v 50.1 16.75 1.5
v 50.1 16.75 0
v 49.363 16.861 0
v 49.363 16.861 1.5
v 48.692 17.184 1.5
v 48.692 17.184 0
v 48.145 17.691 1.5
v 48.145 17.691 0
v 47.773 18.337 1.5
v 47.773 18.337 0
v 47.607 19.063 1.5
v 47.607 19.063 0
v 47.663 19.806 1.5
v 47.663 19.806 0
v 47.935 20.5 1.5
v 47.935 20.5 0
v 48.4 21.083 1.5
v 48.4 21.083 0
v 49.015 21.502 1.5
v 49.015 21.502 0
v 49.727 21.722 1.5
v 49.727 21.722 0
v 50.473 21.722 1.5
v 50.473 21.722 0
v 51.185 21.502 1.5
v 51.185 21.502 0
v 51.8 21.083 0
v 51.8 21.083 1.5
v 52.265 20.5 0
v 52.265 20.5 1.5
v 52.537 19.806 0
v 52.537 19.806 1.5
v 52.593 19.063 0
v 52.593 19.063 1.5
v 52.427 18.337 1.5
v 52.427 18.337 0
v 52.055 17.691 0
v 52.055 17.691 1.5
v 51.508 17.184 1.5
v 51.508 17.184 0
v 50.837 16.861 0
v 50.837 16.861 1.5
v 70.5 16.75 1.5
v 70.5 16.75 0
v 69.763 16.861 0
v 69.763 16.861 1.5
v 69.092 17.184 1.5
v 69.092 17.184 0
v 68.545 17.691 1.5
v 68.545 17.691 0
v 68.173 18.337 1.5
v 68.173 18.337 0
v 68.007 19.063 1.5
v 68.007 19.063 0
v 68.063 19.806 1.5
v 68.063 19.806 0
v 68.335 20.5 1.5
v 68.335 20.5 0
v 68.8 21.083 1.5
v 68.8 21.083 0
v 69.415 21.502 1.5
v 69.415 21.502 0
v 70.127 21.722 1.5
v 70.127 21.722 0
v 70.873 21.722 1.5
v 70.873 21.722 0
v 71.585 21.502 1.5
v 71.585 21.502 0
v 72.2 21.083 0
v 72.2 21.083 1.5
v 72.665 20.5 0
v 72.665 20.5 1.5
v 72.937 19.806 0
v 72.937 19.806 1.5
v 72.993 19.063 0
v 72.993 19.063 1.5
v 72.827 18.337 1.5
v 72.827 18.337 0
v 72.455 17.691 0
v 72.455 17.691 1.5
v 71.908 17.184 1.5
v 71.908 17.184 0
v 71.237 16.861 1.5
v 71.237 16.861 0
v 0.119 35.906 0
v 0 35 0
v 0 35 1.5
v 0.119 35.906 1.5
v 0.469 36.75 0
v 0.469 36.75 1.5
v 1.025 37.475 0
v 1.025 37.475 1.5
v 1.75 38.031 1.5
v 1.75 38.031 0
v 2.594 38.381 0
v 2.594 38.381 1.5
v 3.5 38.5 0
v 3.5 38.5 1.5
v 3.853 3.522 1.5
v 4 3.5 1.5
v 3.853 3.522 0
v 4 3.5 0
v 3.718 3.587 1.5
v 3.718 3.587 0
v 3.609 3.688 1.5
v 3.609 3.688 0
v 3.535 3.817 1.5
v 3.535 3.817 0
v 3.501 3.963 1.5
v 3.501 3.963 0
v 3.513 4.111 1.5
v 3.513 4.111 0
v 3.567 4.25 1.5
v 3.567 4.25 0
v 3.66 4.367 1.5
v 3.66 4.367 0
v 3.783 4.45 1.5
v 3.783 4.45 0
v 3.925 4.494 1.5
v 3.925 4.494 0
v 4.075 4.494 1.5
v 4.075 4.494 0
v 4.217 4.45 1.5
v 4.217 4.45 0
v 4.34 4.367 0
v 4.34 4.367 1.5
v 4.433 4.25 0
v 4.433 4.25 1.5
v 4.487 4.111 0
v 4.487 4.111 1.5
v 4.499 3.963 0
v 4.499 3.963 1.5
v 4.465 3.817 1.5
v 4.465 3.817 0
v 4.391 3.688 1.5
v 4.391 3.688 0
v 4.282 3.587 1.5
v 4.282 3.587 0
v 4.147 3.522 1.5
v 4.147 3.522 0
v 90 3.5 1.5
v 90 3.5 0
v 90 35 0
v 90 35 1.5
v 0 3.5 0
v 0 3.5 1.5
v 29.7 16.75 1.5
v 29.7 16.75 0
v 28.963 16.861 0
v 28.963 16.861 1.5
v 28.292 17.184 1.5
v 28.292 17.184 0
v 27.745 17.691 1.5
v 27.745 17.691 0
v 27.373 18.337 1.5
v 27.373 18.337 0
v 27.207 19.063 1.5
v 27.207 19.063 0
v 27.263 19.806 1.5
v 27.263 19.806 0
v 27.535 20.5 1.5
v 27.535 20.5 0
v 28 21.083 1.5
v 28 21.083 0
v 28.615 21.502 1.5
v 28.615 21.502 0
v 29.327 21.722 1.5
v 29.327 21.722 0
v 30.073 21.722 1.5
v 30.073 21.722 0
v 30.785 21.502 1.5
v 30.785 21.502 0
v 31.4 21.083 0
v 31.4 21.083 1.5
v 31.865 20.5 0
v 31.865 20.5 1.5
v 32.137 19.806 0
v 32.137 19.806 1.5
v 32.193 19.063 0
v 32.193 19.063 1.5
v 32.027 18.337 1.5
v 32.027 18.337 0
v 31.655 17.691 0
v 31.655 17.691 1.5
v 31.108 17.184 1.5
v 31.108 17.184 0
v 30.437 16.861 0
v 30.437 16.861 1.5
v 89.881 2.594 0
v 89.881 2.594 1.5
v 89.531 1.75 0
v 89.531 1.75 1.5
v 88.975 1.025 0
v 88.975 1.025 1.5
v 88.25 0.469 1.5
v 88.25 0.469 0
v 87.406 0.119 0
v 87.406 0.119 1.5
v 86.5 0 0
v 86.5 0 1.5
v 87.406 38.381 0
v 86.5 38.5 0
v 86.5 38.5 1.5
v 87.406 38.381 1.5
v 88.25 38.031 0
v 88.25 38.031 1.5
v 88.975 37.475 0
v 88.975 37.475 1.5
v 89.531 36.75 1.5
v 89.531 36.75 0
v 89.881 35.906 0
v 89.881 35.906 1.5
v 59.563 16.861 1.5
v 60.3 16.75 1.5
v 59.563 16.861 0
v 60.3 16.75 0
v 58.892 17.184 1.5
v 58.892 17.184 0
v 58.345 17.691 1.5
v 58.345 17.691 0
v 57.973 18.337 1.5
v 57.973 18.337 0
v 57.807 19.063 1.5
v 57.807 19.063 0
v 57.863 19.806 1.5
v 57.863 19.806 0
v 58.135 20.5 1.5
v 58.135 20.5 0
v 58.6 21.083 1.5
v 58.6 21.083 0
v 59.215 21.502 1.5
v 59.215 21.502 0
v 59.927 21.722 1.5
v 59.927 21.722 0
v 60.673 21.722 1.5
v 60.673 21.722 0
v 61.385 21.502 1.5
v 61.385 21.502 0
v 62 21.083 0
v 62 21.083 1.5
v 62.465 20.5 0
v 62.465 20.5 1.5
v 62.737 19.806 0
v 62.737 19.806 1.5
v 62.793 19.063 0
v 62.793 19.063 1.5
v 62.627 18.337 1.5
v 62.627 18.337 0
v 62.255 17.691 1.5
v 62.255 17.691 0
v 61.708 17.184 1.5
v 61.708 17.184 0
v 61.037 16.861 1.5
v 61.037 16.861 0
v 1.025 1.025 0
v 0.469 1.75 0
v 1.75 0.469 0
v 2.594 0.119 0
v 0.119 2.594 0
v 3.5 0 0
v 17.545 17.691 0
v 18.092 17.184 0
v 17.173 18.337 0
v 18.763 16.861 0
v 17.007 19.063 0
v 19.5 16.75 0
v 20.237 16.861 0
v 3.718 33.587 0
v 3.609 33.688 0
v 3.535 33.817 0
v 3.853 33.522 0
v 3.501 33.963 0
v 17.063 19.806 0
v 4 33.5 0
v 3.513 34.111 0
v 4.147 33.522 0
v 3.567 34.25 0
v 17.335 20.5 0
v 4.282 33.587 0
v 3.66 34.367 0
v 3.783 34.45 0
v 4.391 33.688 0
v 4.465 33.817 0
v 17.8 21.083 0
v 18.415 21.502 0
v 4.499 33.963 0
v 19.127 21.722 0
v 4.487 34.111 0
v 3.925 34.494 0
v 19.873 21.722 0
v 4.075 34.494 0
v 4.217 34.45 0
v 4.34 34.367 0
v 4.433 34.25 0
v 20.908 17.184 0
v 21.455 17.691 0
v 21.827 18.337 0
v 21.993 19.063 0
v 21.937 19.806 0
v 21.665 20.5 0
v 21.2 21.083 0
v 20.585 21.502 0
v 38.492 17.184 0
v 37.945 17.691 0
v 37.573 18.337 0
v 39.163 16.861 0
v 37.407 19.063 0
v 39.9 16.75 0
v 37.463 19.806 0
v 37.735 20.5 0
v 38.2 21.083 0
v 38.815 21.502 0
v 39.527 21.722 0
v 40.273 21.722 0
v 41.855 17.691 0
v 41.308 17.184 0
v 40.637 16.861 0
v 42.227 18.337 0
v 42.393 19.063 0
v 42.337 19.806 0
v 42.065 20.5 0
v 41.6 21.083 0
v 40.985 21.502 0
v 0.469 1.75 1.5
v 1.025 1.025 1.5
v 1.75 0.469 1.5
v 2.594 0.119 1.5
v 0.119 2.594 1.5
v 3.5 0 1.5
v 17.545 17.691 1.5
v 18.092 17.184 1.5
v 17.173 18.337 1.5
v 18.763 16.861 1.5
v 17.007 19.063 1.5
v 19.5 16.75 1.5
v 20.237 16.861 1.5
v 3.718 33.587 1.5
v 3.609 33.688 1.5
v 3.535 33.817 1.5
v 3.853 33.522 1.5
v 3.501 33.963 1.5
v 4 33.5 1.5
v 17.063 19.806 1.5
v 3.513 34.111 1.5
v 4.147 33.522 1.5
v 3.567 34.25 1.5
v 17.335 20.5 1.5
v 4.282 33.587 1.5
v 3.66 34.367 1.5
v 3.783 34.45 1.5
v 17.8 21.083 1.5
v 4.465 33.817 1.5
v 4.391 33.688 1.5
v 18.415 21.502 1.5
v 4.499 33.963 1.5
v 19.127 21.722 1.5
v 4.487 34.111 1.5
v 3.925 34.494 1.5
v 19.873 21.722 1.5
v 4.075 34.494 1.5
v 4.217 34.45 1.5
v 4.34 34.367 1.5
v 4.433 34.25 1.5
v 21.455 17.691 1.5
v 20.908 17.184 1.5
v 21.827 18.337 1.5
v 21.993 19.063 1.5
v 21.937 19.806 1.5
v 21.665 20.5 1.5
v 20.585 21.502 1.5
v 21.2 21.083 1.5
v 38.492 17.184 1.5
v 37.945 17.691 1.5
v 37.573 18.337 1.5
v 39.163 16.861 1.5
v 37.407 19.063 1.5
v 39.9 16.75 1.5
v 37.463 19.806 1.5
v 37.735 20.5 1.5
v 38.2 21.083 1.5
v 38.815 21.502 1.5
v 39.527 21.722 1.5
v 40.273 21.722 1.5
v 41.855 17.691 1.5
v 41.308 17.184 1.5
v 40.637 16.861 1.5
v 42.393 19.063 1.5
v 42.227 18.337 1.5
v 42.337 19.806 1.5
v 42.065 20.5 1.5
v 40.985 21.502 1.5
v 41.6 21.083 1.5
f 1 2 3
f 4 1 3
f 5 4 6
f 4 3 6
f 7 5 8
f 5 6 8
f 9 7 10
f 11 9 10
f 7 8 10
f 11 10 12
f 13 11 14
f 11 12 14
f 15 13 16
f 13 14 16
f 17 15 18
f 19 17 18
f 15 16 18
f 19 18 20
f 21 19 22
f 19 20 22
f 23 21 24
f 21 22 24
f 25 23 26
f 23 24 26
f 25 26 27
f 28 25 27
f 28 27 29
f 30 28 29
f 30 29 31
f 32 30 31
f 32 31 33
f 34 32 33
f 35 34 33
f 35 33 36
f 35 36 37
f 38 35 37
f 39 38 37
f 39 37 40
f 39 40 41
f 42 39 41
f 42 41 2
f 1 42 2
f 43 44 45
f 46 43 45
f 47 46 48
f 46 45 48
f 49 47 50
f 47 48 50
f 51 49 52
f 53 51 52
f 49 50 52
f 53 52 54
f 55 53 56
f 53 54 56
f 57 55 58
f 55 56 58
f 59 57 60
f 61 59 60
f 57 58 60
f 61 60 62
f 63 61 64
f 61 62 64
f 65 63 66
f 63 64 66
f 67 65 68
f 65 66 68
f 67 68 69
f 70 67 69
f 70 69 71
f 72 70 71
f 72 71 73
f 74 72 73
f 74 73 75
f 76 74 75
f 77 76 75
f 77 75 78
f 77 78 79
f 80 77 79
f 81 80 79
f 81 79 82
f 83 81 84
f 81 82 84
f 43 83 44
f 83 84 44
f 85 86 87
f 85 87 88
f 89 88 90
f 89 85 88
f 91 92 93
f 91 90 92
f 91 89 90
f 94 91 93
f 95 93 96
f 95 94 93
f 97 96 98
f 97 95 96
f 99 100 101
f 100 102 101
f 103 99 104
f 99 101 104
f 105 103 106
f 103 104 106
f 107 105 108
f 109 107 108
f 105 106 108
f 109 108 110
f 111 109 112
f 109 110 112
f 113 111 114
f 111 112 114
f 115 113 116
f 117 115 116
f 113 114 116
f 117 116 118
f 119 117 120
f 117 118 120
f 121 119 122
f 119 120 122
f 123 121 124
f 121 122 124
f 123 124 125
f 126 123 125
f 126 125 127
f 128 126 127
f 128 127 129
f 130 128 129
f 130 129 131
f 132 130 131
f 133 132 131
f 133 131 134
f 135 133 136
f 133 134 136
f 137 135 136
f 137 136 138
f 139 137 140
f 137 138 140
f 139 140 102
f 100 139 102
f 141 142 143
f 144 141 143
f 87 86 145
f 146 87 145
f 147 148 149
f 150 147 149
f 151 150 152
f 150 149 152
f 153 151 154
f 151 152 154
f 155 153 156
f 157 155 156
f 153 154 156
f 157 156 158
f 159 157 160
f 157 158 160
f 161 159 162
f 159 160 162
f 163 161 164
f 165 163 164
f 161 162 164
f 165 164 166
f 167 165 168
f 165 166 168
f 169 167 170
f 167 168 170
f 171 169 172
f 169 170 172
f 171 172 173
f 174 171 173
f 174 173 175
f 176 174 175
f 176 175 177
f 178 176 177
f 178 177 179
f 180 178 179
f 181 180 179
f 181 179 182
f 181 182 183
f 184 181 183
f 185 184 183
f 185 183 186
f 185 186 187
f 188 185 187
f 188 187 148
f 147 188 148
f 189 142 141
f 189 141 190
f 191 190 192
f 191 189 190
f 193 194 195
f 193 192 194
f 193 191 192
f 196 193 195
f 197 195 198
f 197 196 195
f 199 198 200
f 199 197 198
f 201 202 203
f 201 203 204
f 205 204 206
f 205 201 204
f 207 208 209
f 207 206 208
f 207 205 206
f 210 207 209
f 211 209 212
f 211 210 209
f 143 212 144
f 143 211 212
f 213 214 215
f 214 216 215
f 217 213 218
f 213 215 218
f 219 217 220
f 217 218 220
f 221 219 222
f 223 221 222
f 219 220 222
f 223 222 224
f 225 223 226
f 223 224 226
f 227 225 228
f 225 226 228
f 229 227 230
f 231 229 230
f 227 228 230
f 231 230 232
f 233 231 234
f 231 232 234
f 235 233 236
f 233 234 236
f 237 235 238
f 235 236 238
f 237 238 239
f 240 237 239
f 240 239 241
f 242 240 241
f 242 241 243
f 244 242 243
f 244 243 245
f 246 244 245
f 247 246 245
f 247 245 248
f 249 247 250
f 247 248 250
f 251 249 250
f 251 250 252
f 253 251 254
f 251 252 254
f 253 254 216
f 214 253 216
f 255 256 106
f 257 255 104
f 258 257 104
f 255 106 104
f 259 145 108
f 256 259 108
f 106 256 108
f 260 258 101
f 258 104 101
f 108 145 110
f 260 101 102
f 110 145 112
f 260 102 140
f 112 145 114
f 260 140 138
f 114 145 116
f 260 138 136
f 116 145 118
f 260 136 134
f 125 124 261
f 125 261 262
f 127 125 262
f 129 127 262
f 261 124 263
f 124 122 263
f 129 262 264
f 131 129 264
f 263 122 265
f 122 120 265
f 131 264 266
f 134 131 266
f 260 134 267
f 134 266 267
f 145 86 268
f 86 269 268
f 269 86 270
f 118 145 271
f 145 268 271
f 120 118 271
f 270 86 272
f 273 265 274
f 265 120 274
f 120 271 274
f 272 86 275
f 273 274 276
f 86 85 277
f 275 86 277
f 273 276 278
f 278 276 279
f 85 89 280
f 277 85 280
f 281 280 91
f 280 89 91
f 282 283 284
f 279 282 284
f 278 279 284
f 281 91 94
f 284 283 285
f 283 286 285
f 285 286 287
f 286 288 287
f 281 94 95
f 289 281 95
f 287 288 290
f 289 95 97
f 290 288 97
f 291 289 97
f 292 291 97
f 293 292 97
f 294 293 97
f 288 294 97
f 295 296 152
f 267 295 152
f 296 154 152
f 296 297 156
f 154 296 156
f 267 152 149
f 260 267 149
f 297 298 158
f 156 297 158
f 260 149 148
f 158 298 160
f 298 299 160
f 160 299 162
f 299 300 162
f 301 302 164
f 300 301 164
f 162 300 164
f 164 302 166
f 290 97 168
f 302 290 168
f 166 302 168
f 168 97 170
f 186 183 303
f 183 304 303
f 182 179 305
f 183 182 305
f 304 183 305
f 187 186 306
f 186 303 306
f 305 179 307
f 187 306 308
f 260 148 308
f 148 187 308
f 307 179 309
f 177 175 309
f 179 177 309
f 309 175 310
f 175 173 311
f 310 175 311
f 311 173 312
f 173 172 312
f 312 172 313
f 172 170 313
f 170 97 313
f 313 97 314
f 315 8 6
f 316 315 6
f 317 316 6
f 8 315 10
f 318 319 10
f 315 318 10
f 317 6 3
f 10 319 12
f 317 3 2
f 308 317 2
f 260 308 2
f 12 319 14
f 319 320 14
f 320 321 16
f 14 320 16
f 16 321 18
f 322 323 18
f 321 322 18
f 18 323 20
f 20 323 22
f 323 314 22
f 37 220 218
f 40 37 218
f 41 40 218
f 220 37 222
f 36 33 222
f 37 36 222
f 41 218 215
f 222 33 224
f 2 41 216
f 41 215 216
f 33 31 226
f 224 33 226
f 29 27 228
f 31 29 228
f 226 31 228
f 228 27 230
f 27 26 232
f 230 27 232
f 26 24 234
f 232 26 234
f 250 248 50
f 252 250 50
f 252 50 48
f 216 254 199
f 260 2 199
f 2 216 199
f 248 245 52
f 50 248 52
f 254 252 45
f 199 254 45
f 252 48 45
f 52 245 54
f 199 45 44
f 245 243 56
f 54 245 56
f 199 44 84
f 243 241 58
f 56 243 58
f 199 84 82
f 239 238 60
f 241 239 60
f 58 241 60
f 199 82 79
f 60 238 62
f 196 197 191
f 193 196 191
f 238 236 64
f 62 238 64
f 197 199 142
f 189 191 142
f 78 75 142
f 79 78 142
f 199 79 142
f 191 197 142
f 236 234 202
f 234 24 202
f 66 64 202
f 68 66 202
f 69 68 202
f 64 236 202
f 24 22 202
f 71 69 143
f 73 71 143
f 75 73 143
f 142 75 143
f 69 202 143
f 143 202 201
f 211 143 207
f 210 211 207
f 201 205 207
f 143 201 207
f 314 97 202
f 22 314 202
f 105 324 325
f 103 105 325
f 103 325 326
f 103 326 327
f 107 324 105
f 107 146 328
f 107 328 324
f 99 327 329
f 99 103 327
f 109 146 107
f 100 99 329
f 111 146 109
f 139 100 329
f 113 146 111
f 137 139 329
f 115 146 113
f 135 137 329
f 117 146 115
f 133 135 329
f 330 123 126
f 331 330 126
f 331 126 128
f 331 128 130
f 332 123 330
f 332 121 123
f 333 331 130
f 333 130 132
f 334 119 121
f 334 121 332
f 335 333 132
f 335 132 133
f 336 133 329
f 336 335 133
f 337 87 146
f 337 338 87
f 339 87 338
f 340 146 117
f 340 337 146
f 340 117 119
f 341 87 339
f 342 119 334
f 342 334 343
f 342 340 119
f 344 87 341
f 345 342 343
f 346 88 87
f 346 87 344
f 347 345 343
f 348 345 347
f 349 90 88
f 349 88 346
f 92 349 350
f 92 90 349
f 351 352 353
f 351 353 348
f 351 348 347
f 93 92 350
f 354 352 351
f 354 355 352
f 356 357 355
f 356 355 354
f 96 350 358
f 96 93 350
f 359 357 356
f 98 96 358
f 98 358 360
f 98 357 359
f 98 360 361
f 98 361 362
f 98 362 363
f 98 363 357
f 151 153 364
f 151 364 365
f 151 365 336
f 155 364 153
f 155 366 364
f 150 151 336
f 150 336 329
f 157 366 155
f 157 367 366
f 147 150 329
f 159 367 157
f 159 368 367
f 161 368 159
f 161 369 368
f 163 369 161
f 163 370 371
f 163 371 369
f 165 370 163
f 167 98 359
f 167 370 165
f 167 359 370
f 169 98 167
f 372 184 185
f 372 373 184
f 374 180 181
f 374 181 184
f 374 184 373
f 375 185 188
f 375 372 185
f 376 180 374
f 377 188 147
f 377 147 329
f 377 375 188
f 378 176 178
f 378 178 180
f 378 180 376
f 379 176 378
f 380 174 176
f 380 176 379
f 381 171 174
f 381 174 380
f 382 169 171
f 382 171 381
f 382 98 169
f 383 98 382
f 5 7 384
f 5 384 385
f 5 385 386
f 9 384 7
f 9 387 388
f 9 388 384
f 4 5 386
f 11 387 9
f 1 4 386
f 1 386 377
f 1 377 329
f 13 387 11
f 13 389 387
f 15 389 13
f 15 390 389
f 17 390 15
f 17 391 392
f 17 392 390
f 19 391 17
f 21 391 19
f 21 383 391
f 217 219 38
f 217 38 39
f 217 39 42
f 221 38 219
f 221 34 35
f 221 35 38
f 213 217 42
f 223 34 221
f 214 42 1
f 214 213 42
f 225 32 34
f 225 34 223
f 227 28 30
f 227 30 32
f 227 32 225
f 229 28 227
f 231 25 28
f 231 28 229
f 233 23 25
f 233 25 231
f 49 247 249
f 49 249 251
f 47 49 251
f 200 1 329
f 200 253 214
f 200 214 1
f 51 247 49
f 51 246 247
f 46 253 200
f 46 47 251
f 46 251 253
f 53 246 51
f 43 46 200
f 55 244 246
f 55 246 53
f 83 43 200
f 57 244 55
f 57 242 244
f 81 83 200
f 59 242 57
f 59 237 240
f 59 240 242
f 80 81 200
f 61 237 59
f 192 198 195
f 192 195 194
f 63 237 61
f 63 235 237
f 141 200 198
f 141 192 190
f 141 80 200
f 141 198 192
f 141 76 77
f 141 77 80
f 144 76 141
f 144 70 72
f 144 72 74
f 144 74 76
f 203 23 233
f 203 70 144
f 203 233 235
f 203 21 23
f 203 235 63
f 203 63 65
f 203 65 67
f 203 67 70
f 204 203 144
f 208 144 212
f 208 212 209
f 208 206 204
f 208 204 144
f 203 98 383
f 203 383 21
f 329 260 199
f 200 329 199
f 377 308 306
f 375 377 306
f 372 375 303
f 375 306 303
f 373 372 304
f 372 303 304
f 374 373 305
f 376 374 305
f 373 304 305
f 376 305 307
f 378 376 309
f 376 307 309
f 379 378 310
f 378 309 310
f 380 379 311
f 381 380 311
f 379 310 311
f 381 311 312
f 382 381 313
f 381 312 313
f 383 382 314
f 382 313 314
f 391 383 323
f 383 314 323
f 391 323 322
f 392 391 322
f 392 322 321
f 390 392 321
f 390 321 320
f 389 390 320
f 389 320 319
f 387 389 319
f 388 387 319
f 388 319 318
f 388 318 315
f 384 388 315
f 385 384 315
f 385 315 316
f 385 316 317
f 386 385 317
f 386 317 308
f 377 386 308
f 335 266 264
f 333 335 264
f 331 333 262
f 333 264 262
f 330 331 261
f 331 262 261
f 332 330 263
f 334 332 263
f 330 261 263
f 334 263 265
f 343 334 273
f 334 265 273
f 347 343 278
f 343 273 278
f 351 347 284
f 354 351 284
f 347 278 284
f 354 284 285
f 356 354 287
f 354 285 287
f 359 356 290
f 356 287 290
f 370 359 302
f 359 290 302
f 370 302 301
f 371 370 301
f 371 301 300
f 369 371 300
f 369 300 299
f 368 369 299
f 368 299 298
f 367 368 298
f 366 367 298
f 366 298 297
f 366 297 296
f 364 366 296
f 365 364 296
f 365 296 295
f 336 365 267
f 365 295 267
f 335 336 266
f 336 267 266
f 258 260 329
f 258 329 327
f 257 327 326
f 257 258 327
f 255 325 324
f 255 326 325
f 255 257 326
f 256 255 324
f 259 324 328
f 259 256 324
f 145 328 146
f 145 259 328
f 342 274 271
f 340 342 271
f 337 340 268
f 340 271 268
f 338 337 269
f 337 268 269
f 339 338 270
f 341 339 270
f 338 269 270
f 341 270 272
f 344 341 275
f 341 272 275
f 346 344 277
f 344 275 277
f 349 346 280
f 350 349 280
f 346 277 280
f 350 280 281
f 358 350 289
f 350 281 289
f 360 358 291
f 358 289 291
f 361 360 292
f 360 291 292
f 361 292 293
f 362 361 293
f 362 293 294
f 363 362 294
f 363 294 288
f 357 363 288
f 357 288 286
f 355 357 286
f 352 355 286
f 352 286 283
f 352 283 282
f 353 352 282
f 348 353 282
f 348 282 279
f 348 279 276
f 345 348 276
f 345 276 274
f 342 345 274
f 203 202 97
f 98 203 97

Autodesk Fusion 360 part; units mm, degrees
sketch "スケッチ1" plane through (0, 0, 0) normal (0, 0, 1) x (1, 0, 0)
  line L0 (3.5, 0) -> (86.5, 0)
  line L1 (90, 3.5) -> (90, 35)
  line L2 (86.5, 38.5) -> (3.5, 38.5)
  line L3 (0, 35) -> (0, 3.5)
  line L4 (0, 19.25) -> (90, 19.25)
  arc A0 (3.5, 38.5) -> (0, 35) centre (3.5, 35) ccw
  arc A1 (90, 35) -> (86.5, 38.5) centre (86.5, 35) ccw
  arc A2 (86.5, 0) -> (90, 3.5) centre (86.5, 3.5) ccw
  arc A3 (0, 3.5) -> (3.5, 0) centre (3.5, 3.5) ccw
  point P0 (90, 0)
  point P1 (0, 38.5)
  dimension "d1" = 90
  dimension "d2" = 38.5
  dimension "d3" = 3.5
extrude "押し出し1" add sketch "スケッチ1" along normal blind 1.5
sketch "スケッチ2" plane through (0, 0, 1.5) normal (0, 0, 1) x (-1, 0, 0)
  arc A0 (0, -3.5) -> (-3.5, 0) centre (-3.5, -3.5) ccw
  line L0 (-3.5, 0) -> (-86.5, 0)
  arc A1 (-86.5, 0) -> (-90, -3.5) centre (-86.5, -3.5) ccw
  line L1 (-90, -3.5) -> (-90, -35)
  arc A2 (-90, -35) -> (-86.5, -38.5) centre (-86.5, -35) ccw
  line L2 (-86.5, -38.5) -> (-3.5, -38.5)
  arc A3 (-3.5, -38.5) -> (0, -35) centre (-3.5, -35) ccw
  line L3 (0, -35) -> (0, -3.5)
  line L4 (-45, -38.5) -> (-45, 0)
  line L5 (0, -19.25) -> (-90, -19.25)
  line L6 (-45, -19.25) -> (-50.1, -19.25)
  line L7 (-50.1, -19.25) -> (-60.3, -19.25)
  line L8 (-60.3, -19.25) -> (-70.5, -19.25)
  point P0 (-50.1, -19.25)
  point P1 (-60.3, -19.25)
  point P2 (-70.5, -19.25)
  point P3 (-39.9, -19.25)
  point P4 (-29.7, -19.25)
  point P5 (-19.5, -19.25)
  dimension "d6" = 5.1
  dimension "d7" = 10.2
  dimension "d8" = 10.2
hole "穴1" at (19.5, 19.25, 1.5) at (29.7, 19.25, 1.5) at (39.9, 19.25, 1.5) at (50.1, 19.25, 1.5) at (60.3, 19.25, 1.5) at (70.5, 19.25, 1.5) direction (0, 0, -1) diameter 5 depth 1.5 tip angle 180
sketch "スケッチ3" plane through (0, 0, 1.5) normal (0, 0, 1) x (-1, 0, 0)
  circle A0 centre (-60.3, -19.25) radius 2.5
  circle A1 centre (-39.9, -19.25) radius 2.5
  circle A2 centre (-19.5, -19.25) radius 2.5
  circle A3 centre (-29.7, -19.25) radius 2.5
  circle A4 centre (-50.1, -19.25) radius 2.5
  circle A5 centre (-70.5, -19.25) radius 2.5
  arc A6 (0, -3.5) -> (-3.5, 0) centre (-3.5, -3.5) ccw
  line L0 (-3.5, 0) -> (-86.5, 0)
  arc A7 (-86.5, 0) -> (-90, -3.5) centre (-86.5, -3.5) ccw
  line L1 (-90, -3.5) -> (-90, -35)
  arc A8 (-90, -35) -> (-86.5, -38.5) centre (-86.5, -35) ccw
  line L2 (-86.5, -38.5) -> (-3.5, -38.5)
  arc A9 (-3.5, -38.5) -> (0, -35) centre (-3.5, -35) ccw
  line L3 (0, -35) -> (0, -3.5)
  line L4 (-4, -4) -> (-4, -34)
hole "穴2" at (4, 4, 1.5) at (4, 34, 1.5) direction (0, 0, -1) diameter 1 depth 1.5 tip angle 180
sketch "スケッチ5" plane through (0, 0, 0) normal (0, 0, 1) x (1, 0, 0)
sketch "スケッチ6" plane through (0, 0, 0) normal (0, 0, 1) x (1, 0, 0)
